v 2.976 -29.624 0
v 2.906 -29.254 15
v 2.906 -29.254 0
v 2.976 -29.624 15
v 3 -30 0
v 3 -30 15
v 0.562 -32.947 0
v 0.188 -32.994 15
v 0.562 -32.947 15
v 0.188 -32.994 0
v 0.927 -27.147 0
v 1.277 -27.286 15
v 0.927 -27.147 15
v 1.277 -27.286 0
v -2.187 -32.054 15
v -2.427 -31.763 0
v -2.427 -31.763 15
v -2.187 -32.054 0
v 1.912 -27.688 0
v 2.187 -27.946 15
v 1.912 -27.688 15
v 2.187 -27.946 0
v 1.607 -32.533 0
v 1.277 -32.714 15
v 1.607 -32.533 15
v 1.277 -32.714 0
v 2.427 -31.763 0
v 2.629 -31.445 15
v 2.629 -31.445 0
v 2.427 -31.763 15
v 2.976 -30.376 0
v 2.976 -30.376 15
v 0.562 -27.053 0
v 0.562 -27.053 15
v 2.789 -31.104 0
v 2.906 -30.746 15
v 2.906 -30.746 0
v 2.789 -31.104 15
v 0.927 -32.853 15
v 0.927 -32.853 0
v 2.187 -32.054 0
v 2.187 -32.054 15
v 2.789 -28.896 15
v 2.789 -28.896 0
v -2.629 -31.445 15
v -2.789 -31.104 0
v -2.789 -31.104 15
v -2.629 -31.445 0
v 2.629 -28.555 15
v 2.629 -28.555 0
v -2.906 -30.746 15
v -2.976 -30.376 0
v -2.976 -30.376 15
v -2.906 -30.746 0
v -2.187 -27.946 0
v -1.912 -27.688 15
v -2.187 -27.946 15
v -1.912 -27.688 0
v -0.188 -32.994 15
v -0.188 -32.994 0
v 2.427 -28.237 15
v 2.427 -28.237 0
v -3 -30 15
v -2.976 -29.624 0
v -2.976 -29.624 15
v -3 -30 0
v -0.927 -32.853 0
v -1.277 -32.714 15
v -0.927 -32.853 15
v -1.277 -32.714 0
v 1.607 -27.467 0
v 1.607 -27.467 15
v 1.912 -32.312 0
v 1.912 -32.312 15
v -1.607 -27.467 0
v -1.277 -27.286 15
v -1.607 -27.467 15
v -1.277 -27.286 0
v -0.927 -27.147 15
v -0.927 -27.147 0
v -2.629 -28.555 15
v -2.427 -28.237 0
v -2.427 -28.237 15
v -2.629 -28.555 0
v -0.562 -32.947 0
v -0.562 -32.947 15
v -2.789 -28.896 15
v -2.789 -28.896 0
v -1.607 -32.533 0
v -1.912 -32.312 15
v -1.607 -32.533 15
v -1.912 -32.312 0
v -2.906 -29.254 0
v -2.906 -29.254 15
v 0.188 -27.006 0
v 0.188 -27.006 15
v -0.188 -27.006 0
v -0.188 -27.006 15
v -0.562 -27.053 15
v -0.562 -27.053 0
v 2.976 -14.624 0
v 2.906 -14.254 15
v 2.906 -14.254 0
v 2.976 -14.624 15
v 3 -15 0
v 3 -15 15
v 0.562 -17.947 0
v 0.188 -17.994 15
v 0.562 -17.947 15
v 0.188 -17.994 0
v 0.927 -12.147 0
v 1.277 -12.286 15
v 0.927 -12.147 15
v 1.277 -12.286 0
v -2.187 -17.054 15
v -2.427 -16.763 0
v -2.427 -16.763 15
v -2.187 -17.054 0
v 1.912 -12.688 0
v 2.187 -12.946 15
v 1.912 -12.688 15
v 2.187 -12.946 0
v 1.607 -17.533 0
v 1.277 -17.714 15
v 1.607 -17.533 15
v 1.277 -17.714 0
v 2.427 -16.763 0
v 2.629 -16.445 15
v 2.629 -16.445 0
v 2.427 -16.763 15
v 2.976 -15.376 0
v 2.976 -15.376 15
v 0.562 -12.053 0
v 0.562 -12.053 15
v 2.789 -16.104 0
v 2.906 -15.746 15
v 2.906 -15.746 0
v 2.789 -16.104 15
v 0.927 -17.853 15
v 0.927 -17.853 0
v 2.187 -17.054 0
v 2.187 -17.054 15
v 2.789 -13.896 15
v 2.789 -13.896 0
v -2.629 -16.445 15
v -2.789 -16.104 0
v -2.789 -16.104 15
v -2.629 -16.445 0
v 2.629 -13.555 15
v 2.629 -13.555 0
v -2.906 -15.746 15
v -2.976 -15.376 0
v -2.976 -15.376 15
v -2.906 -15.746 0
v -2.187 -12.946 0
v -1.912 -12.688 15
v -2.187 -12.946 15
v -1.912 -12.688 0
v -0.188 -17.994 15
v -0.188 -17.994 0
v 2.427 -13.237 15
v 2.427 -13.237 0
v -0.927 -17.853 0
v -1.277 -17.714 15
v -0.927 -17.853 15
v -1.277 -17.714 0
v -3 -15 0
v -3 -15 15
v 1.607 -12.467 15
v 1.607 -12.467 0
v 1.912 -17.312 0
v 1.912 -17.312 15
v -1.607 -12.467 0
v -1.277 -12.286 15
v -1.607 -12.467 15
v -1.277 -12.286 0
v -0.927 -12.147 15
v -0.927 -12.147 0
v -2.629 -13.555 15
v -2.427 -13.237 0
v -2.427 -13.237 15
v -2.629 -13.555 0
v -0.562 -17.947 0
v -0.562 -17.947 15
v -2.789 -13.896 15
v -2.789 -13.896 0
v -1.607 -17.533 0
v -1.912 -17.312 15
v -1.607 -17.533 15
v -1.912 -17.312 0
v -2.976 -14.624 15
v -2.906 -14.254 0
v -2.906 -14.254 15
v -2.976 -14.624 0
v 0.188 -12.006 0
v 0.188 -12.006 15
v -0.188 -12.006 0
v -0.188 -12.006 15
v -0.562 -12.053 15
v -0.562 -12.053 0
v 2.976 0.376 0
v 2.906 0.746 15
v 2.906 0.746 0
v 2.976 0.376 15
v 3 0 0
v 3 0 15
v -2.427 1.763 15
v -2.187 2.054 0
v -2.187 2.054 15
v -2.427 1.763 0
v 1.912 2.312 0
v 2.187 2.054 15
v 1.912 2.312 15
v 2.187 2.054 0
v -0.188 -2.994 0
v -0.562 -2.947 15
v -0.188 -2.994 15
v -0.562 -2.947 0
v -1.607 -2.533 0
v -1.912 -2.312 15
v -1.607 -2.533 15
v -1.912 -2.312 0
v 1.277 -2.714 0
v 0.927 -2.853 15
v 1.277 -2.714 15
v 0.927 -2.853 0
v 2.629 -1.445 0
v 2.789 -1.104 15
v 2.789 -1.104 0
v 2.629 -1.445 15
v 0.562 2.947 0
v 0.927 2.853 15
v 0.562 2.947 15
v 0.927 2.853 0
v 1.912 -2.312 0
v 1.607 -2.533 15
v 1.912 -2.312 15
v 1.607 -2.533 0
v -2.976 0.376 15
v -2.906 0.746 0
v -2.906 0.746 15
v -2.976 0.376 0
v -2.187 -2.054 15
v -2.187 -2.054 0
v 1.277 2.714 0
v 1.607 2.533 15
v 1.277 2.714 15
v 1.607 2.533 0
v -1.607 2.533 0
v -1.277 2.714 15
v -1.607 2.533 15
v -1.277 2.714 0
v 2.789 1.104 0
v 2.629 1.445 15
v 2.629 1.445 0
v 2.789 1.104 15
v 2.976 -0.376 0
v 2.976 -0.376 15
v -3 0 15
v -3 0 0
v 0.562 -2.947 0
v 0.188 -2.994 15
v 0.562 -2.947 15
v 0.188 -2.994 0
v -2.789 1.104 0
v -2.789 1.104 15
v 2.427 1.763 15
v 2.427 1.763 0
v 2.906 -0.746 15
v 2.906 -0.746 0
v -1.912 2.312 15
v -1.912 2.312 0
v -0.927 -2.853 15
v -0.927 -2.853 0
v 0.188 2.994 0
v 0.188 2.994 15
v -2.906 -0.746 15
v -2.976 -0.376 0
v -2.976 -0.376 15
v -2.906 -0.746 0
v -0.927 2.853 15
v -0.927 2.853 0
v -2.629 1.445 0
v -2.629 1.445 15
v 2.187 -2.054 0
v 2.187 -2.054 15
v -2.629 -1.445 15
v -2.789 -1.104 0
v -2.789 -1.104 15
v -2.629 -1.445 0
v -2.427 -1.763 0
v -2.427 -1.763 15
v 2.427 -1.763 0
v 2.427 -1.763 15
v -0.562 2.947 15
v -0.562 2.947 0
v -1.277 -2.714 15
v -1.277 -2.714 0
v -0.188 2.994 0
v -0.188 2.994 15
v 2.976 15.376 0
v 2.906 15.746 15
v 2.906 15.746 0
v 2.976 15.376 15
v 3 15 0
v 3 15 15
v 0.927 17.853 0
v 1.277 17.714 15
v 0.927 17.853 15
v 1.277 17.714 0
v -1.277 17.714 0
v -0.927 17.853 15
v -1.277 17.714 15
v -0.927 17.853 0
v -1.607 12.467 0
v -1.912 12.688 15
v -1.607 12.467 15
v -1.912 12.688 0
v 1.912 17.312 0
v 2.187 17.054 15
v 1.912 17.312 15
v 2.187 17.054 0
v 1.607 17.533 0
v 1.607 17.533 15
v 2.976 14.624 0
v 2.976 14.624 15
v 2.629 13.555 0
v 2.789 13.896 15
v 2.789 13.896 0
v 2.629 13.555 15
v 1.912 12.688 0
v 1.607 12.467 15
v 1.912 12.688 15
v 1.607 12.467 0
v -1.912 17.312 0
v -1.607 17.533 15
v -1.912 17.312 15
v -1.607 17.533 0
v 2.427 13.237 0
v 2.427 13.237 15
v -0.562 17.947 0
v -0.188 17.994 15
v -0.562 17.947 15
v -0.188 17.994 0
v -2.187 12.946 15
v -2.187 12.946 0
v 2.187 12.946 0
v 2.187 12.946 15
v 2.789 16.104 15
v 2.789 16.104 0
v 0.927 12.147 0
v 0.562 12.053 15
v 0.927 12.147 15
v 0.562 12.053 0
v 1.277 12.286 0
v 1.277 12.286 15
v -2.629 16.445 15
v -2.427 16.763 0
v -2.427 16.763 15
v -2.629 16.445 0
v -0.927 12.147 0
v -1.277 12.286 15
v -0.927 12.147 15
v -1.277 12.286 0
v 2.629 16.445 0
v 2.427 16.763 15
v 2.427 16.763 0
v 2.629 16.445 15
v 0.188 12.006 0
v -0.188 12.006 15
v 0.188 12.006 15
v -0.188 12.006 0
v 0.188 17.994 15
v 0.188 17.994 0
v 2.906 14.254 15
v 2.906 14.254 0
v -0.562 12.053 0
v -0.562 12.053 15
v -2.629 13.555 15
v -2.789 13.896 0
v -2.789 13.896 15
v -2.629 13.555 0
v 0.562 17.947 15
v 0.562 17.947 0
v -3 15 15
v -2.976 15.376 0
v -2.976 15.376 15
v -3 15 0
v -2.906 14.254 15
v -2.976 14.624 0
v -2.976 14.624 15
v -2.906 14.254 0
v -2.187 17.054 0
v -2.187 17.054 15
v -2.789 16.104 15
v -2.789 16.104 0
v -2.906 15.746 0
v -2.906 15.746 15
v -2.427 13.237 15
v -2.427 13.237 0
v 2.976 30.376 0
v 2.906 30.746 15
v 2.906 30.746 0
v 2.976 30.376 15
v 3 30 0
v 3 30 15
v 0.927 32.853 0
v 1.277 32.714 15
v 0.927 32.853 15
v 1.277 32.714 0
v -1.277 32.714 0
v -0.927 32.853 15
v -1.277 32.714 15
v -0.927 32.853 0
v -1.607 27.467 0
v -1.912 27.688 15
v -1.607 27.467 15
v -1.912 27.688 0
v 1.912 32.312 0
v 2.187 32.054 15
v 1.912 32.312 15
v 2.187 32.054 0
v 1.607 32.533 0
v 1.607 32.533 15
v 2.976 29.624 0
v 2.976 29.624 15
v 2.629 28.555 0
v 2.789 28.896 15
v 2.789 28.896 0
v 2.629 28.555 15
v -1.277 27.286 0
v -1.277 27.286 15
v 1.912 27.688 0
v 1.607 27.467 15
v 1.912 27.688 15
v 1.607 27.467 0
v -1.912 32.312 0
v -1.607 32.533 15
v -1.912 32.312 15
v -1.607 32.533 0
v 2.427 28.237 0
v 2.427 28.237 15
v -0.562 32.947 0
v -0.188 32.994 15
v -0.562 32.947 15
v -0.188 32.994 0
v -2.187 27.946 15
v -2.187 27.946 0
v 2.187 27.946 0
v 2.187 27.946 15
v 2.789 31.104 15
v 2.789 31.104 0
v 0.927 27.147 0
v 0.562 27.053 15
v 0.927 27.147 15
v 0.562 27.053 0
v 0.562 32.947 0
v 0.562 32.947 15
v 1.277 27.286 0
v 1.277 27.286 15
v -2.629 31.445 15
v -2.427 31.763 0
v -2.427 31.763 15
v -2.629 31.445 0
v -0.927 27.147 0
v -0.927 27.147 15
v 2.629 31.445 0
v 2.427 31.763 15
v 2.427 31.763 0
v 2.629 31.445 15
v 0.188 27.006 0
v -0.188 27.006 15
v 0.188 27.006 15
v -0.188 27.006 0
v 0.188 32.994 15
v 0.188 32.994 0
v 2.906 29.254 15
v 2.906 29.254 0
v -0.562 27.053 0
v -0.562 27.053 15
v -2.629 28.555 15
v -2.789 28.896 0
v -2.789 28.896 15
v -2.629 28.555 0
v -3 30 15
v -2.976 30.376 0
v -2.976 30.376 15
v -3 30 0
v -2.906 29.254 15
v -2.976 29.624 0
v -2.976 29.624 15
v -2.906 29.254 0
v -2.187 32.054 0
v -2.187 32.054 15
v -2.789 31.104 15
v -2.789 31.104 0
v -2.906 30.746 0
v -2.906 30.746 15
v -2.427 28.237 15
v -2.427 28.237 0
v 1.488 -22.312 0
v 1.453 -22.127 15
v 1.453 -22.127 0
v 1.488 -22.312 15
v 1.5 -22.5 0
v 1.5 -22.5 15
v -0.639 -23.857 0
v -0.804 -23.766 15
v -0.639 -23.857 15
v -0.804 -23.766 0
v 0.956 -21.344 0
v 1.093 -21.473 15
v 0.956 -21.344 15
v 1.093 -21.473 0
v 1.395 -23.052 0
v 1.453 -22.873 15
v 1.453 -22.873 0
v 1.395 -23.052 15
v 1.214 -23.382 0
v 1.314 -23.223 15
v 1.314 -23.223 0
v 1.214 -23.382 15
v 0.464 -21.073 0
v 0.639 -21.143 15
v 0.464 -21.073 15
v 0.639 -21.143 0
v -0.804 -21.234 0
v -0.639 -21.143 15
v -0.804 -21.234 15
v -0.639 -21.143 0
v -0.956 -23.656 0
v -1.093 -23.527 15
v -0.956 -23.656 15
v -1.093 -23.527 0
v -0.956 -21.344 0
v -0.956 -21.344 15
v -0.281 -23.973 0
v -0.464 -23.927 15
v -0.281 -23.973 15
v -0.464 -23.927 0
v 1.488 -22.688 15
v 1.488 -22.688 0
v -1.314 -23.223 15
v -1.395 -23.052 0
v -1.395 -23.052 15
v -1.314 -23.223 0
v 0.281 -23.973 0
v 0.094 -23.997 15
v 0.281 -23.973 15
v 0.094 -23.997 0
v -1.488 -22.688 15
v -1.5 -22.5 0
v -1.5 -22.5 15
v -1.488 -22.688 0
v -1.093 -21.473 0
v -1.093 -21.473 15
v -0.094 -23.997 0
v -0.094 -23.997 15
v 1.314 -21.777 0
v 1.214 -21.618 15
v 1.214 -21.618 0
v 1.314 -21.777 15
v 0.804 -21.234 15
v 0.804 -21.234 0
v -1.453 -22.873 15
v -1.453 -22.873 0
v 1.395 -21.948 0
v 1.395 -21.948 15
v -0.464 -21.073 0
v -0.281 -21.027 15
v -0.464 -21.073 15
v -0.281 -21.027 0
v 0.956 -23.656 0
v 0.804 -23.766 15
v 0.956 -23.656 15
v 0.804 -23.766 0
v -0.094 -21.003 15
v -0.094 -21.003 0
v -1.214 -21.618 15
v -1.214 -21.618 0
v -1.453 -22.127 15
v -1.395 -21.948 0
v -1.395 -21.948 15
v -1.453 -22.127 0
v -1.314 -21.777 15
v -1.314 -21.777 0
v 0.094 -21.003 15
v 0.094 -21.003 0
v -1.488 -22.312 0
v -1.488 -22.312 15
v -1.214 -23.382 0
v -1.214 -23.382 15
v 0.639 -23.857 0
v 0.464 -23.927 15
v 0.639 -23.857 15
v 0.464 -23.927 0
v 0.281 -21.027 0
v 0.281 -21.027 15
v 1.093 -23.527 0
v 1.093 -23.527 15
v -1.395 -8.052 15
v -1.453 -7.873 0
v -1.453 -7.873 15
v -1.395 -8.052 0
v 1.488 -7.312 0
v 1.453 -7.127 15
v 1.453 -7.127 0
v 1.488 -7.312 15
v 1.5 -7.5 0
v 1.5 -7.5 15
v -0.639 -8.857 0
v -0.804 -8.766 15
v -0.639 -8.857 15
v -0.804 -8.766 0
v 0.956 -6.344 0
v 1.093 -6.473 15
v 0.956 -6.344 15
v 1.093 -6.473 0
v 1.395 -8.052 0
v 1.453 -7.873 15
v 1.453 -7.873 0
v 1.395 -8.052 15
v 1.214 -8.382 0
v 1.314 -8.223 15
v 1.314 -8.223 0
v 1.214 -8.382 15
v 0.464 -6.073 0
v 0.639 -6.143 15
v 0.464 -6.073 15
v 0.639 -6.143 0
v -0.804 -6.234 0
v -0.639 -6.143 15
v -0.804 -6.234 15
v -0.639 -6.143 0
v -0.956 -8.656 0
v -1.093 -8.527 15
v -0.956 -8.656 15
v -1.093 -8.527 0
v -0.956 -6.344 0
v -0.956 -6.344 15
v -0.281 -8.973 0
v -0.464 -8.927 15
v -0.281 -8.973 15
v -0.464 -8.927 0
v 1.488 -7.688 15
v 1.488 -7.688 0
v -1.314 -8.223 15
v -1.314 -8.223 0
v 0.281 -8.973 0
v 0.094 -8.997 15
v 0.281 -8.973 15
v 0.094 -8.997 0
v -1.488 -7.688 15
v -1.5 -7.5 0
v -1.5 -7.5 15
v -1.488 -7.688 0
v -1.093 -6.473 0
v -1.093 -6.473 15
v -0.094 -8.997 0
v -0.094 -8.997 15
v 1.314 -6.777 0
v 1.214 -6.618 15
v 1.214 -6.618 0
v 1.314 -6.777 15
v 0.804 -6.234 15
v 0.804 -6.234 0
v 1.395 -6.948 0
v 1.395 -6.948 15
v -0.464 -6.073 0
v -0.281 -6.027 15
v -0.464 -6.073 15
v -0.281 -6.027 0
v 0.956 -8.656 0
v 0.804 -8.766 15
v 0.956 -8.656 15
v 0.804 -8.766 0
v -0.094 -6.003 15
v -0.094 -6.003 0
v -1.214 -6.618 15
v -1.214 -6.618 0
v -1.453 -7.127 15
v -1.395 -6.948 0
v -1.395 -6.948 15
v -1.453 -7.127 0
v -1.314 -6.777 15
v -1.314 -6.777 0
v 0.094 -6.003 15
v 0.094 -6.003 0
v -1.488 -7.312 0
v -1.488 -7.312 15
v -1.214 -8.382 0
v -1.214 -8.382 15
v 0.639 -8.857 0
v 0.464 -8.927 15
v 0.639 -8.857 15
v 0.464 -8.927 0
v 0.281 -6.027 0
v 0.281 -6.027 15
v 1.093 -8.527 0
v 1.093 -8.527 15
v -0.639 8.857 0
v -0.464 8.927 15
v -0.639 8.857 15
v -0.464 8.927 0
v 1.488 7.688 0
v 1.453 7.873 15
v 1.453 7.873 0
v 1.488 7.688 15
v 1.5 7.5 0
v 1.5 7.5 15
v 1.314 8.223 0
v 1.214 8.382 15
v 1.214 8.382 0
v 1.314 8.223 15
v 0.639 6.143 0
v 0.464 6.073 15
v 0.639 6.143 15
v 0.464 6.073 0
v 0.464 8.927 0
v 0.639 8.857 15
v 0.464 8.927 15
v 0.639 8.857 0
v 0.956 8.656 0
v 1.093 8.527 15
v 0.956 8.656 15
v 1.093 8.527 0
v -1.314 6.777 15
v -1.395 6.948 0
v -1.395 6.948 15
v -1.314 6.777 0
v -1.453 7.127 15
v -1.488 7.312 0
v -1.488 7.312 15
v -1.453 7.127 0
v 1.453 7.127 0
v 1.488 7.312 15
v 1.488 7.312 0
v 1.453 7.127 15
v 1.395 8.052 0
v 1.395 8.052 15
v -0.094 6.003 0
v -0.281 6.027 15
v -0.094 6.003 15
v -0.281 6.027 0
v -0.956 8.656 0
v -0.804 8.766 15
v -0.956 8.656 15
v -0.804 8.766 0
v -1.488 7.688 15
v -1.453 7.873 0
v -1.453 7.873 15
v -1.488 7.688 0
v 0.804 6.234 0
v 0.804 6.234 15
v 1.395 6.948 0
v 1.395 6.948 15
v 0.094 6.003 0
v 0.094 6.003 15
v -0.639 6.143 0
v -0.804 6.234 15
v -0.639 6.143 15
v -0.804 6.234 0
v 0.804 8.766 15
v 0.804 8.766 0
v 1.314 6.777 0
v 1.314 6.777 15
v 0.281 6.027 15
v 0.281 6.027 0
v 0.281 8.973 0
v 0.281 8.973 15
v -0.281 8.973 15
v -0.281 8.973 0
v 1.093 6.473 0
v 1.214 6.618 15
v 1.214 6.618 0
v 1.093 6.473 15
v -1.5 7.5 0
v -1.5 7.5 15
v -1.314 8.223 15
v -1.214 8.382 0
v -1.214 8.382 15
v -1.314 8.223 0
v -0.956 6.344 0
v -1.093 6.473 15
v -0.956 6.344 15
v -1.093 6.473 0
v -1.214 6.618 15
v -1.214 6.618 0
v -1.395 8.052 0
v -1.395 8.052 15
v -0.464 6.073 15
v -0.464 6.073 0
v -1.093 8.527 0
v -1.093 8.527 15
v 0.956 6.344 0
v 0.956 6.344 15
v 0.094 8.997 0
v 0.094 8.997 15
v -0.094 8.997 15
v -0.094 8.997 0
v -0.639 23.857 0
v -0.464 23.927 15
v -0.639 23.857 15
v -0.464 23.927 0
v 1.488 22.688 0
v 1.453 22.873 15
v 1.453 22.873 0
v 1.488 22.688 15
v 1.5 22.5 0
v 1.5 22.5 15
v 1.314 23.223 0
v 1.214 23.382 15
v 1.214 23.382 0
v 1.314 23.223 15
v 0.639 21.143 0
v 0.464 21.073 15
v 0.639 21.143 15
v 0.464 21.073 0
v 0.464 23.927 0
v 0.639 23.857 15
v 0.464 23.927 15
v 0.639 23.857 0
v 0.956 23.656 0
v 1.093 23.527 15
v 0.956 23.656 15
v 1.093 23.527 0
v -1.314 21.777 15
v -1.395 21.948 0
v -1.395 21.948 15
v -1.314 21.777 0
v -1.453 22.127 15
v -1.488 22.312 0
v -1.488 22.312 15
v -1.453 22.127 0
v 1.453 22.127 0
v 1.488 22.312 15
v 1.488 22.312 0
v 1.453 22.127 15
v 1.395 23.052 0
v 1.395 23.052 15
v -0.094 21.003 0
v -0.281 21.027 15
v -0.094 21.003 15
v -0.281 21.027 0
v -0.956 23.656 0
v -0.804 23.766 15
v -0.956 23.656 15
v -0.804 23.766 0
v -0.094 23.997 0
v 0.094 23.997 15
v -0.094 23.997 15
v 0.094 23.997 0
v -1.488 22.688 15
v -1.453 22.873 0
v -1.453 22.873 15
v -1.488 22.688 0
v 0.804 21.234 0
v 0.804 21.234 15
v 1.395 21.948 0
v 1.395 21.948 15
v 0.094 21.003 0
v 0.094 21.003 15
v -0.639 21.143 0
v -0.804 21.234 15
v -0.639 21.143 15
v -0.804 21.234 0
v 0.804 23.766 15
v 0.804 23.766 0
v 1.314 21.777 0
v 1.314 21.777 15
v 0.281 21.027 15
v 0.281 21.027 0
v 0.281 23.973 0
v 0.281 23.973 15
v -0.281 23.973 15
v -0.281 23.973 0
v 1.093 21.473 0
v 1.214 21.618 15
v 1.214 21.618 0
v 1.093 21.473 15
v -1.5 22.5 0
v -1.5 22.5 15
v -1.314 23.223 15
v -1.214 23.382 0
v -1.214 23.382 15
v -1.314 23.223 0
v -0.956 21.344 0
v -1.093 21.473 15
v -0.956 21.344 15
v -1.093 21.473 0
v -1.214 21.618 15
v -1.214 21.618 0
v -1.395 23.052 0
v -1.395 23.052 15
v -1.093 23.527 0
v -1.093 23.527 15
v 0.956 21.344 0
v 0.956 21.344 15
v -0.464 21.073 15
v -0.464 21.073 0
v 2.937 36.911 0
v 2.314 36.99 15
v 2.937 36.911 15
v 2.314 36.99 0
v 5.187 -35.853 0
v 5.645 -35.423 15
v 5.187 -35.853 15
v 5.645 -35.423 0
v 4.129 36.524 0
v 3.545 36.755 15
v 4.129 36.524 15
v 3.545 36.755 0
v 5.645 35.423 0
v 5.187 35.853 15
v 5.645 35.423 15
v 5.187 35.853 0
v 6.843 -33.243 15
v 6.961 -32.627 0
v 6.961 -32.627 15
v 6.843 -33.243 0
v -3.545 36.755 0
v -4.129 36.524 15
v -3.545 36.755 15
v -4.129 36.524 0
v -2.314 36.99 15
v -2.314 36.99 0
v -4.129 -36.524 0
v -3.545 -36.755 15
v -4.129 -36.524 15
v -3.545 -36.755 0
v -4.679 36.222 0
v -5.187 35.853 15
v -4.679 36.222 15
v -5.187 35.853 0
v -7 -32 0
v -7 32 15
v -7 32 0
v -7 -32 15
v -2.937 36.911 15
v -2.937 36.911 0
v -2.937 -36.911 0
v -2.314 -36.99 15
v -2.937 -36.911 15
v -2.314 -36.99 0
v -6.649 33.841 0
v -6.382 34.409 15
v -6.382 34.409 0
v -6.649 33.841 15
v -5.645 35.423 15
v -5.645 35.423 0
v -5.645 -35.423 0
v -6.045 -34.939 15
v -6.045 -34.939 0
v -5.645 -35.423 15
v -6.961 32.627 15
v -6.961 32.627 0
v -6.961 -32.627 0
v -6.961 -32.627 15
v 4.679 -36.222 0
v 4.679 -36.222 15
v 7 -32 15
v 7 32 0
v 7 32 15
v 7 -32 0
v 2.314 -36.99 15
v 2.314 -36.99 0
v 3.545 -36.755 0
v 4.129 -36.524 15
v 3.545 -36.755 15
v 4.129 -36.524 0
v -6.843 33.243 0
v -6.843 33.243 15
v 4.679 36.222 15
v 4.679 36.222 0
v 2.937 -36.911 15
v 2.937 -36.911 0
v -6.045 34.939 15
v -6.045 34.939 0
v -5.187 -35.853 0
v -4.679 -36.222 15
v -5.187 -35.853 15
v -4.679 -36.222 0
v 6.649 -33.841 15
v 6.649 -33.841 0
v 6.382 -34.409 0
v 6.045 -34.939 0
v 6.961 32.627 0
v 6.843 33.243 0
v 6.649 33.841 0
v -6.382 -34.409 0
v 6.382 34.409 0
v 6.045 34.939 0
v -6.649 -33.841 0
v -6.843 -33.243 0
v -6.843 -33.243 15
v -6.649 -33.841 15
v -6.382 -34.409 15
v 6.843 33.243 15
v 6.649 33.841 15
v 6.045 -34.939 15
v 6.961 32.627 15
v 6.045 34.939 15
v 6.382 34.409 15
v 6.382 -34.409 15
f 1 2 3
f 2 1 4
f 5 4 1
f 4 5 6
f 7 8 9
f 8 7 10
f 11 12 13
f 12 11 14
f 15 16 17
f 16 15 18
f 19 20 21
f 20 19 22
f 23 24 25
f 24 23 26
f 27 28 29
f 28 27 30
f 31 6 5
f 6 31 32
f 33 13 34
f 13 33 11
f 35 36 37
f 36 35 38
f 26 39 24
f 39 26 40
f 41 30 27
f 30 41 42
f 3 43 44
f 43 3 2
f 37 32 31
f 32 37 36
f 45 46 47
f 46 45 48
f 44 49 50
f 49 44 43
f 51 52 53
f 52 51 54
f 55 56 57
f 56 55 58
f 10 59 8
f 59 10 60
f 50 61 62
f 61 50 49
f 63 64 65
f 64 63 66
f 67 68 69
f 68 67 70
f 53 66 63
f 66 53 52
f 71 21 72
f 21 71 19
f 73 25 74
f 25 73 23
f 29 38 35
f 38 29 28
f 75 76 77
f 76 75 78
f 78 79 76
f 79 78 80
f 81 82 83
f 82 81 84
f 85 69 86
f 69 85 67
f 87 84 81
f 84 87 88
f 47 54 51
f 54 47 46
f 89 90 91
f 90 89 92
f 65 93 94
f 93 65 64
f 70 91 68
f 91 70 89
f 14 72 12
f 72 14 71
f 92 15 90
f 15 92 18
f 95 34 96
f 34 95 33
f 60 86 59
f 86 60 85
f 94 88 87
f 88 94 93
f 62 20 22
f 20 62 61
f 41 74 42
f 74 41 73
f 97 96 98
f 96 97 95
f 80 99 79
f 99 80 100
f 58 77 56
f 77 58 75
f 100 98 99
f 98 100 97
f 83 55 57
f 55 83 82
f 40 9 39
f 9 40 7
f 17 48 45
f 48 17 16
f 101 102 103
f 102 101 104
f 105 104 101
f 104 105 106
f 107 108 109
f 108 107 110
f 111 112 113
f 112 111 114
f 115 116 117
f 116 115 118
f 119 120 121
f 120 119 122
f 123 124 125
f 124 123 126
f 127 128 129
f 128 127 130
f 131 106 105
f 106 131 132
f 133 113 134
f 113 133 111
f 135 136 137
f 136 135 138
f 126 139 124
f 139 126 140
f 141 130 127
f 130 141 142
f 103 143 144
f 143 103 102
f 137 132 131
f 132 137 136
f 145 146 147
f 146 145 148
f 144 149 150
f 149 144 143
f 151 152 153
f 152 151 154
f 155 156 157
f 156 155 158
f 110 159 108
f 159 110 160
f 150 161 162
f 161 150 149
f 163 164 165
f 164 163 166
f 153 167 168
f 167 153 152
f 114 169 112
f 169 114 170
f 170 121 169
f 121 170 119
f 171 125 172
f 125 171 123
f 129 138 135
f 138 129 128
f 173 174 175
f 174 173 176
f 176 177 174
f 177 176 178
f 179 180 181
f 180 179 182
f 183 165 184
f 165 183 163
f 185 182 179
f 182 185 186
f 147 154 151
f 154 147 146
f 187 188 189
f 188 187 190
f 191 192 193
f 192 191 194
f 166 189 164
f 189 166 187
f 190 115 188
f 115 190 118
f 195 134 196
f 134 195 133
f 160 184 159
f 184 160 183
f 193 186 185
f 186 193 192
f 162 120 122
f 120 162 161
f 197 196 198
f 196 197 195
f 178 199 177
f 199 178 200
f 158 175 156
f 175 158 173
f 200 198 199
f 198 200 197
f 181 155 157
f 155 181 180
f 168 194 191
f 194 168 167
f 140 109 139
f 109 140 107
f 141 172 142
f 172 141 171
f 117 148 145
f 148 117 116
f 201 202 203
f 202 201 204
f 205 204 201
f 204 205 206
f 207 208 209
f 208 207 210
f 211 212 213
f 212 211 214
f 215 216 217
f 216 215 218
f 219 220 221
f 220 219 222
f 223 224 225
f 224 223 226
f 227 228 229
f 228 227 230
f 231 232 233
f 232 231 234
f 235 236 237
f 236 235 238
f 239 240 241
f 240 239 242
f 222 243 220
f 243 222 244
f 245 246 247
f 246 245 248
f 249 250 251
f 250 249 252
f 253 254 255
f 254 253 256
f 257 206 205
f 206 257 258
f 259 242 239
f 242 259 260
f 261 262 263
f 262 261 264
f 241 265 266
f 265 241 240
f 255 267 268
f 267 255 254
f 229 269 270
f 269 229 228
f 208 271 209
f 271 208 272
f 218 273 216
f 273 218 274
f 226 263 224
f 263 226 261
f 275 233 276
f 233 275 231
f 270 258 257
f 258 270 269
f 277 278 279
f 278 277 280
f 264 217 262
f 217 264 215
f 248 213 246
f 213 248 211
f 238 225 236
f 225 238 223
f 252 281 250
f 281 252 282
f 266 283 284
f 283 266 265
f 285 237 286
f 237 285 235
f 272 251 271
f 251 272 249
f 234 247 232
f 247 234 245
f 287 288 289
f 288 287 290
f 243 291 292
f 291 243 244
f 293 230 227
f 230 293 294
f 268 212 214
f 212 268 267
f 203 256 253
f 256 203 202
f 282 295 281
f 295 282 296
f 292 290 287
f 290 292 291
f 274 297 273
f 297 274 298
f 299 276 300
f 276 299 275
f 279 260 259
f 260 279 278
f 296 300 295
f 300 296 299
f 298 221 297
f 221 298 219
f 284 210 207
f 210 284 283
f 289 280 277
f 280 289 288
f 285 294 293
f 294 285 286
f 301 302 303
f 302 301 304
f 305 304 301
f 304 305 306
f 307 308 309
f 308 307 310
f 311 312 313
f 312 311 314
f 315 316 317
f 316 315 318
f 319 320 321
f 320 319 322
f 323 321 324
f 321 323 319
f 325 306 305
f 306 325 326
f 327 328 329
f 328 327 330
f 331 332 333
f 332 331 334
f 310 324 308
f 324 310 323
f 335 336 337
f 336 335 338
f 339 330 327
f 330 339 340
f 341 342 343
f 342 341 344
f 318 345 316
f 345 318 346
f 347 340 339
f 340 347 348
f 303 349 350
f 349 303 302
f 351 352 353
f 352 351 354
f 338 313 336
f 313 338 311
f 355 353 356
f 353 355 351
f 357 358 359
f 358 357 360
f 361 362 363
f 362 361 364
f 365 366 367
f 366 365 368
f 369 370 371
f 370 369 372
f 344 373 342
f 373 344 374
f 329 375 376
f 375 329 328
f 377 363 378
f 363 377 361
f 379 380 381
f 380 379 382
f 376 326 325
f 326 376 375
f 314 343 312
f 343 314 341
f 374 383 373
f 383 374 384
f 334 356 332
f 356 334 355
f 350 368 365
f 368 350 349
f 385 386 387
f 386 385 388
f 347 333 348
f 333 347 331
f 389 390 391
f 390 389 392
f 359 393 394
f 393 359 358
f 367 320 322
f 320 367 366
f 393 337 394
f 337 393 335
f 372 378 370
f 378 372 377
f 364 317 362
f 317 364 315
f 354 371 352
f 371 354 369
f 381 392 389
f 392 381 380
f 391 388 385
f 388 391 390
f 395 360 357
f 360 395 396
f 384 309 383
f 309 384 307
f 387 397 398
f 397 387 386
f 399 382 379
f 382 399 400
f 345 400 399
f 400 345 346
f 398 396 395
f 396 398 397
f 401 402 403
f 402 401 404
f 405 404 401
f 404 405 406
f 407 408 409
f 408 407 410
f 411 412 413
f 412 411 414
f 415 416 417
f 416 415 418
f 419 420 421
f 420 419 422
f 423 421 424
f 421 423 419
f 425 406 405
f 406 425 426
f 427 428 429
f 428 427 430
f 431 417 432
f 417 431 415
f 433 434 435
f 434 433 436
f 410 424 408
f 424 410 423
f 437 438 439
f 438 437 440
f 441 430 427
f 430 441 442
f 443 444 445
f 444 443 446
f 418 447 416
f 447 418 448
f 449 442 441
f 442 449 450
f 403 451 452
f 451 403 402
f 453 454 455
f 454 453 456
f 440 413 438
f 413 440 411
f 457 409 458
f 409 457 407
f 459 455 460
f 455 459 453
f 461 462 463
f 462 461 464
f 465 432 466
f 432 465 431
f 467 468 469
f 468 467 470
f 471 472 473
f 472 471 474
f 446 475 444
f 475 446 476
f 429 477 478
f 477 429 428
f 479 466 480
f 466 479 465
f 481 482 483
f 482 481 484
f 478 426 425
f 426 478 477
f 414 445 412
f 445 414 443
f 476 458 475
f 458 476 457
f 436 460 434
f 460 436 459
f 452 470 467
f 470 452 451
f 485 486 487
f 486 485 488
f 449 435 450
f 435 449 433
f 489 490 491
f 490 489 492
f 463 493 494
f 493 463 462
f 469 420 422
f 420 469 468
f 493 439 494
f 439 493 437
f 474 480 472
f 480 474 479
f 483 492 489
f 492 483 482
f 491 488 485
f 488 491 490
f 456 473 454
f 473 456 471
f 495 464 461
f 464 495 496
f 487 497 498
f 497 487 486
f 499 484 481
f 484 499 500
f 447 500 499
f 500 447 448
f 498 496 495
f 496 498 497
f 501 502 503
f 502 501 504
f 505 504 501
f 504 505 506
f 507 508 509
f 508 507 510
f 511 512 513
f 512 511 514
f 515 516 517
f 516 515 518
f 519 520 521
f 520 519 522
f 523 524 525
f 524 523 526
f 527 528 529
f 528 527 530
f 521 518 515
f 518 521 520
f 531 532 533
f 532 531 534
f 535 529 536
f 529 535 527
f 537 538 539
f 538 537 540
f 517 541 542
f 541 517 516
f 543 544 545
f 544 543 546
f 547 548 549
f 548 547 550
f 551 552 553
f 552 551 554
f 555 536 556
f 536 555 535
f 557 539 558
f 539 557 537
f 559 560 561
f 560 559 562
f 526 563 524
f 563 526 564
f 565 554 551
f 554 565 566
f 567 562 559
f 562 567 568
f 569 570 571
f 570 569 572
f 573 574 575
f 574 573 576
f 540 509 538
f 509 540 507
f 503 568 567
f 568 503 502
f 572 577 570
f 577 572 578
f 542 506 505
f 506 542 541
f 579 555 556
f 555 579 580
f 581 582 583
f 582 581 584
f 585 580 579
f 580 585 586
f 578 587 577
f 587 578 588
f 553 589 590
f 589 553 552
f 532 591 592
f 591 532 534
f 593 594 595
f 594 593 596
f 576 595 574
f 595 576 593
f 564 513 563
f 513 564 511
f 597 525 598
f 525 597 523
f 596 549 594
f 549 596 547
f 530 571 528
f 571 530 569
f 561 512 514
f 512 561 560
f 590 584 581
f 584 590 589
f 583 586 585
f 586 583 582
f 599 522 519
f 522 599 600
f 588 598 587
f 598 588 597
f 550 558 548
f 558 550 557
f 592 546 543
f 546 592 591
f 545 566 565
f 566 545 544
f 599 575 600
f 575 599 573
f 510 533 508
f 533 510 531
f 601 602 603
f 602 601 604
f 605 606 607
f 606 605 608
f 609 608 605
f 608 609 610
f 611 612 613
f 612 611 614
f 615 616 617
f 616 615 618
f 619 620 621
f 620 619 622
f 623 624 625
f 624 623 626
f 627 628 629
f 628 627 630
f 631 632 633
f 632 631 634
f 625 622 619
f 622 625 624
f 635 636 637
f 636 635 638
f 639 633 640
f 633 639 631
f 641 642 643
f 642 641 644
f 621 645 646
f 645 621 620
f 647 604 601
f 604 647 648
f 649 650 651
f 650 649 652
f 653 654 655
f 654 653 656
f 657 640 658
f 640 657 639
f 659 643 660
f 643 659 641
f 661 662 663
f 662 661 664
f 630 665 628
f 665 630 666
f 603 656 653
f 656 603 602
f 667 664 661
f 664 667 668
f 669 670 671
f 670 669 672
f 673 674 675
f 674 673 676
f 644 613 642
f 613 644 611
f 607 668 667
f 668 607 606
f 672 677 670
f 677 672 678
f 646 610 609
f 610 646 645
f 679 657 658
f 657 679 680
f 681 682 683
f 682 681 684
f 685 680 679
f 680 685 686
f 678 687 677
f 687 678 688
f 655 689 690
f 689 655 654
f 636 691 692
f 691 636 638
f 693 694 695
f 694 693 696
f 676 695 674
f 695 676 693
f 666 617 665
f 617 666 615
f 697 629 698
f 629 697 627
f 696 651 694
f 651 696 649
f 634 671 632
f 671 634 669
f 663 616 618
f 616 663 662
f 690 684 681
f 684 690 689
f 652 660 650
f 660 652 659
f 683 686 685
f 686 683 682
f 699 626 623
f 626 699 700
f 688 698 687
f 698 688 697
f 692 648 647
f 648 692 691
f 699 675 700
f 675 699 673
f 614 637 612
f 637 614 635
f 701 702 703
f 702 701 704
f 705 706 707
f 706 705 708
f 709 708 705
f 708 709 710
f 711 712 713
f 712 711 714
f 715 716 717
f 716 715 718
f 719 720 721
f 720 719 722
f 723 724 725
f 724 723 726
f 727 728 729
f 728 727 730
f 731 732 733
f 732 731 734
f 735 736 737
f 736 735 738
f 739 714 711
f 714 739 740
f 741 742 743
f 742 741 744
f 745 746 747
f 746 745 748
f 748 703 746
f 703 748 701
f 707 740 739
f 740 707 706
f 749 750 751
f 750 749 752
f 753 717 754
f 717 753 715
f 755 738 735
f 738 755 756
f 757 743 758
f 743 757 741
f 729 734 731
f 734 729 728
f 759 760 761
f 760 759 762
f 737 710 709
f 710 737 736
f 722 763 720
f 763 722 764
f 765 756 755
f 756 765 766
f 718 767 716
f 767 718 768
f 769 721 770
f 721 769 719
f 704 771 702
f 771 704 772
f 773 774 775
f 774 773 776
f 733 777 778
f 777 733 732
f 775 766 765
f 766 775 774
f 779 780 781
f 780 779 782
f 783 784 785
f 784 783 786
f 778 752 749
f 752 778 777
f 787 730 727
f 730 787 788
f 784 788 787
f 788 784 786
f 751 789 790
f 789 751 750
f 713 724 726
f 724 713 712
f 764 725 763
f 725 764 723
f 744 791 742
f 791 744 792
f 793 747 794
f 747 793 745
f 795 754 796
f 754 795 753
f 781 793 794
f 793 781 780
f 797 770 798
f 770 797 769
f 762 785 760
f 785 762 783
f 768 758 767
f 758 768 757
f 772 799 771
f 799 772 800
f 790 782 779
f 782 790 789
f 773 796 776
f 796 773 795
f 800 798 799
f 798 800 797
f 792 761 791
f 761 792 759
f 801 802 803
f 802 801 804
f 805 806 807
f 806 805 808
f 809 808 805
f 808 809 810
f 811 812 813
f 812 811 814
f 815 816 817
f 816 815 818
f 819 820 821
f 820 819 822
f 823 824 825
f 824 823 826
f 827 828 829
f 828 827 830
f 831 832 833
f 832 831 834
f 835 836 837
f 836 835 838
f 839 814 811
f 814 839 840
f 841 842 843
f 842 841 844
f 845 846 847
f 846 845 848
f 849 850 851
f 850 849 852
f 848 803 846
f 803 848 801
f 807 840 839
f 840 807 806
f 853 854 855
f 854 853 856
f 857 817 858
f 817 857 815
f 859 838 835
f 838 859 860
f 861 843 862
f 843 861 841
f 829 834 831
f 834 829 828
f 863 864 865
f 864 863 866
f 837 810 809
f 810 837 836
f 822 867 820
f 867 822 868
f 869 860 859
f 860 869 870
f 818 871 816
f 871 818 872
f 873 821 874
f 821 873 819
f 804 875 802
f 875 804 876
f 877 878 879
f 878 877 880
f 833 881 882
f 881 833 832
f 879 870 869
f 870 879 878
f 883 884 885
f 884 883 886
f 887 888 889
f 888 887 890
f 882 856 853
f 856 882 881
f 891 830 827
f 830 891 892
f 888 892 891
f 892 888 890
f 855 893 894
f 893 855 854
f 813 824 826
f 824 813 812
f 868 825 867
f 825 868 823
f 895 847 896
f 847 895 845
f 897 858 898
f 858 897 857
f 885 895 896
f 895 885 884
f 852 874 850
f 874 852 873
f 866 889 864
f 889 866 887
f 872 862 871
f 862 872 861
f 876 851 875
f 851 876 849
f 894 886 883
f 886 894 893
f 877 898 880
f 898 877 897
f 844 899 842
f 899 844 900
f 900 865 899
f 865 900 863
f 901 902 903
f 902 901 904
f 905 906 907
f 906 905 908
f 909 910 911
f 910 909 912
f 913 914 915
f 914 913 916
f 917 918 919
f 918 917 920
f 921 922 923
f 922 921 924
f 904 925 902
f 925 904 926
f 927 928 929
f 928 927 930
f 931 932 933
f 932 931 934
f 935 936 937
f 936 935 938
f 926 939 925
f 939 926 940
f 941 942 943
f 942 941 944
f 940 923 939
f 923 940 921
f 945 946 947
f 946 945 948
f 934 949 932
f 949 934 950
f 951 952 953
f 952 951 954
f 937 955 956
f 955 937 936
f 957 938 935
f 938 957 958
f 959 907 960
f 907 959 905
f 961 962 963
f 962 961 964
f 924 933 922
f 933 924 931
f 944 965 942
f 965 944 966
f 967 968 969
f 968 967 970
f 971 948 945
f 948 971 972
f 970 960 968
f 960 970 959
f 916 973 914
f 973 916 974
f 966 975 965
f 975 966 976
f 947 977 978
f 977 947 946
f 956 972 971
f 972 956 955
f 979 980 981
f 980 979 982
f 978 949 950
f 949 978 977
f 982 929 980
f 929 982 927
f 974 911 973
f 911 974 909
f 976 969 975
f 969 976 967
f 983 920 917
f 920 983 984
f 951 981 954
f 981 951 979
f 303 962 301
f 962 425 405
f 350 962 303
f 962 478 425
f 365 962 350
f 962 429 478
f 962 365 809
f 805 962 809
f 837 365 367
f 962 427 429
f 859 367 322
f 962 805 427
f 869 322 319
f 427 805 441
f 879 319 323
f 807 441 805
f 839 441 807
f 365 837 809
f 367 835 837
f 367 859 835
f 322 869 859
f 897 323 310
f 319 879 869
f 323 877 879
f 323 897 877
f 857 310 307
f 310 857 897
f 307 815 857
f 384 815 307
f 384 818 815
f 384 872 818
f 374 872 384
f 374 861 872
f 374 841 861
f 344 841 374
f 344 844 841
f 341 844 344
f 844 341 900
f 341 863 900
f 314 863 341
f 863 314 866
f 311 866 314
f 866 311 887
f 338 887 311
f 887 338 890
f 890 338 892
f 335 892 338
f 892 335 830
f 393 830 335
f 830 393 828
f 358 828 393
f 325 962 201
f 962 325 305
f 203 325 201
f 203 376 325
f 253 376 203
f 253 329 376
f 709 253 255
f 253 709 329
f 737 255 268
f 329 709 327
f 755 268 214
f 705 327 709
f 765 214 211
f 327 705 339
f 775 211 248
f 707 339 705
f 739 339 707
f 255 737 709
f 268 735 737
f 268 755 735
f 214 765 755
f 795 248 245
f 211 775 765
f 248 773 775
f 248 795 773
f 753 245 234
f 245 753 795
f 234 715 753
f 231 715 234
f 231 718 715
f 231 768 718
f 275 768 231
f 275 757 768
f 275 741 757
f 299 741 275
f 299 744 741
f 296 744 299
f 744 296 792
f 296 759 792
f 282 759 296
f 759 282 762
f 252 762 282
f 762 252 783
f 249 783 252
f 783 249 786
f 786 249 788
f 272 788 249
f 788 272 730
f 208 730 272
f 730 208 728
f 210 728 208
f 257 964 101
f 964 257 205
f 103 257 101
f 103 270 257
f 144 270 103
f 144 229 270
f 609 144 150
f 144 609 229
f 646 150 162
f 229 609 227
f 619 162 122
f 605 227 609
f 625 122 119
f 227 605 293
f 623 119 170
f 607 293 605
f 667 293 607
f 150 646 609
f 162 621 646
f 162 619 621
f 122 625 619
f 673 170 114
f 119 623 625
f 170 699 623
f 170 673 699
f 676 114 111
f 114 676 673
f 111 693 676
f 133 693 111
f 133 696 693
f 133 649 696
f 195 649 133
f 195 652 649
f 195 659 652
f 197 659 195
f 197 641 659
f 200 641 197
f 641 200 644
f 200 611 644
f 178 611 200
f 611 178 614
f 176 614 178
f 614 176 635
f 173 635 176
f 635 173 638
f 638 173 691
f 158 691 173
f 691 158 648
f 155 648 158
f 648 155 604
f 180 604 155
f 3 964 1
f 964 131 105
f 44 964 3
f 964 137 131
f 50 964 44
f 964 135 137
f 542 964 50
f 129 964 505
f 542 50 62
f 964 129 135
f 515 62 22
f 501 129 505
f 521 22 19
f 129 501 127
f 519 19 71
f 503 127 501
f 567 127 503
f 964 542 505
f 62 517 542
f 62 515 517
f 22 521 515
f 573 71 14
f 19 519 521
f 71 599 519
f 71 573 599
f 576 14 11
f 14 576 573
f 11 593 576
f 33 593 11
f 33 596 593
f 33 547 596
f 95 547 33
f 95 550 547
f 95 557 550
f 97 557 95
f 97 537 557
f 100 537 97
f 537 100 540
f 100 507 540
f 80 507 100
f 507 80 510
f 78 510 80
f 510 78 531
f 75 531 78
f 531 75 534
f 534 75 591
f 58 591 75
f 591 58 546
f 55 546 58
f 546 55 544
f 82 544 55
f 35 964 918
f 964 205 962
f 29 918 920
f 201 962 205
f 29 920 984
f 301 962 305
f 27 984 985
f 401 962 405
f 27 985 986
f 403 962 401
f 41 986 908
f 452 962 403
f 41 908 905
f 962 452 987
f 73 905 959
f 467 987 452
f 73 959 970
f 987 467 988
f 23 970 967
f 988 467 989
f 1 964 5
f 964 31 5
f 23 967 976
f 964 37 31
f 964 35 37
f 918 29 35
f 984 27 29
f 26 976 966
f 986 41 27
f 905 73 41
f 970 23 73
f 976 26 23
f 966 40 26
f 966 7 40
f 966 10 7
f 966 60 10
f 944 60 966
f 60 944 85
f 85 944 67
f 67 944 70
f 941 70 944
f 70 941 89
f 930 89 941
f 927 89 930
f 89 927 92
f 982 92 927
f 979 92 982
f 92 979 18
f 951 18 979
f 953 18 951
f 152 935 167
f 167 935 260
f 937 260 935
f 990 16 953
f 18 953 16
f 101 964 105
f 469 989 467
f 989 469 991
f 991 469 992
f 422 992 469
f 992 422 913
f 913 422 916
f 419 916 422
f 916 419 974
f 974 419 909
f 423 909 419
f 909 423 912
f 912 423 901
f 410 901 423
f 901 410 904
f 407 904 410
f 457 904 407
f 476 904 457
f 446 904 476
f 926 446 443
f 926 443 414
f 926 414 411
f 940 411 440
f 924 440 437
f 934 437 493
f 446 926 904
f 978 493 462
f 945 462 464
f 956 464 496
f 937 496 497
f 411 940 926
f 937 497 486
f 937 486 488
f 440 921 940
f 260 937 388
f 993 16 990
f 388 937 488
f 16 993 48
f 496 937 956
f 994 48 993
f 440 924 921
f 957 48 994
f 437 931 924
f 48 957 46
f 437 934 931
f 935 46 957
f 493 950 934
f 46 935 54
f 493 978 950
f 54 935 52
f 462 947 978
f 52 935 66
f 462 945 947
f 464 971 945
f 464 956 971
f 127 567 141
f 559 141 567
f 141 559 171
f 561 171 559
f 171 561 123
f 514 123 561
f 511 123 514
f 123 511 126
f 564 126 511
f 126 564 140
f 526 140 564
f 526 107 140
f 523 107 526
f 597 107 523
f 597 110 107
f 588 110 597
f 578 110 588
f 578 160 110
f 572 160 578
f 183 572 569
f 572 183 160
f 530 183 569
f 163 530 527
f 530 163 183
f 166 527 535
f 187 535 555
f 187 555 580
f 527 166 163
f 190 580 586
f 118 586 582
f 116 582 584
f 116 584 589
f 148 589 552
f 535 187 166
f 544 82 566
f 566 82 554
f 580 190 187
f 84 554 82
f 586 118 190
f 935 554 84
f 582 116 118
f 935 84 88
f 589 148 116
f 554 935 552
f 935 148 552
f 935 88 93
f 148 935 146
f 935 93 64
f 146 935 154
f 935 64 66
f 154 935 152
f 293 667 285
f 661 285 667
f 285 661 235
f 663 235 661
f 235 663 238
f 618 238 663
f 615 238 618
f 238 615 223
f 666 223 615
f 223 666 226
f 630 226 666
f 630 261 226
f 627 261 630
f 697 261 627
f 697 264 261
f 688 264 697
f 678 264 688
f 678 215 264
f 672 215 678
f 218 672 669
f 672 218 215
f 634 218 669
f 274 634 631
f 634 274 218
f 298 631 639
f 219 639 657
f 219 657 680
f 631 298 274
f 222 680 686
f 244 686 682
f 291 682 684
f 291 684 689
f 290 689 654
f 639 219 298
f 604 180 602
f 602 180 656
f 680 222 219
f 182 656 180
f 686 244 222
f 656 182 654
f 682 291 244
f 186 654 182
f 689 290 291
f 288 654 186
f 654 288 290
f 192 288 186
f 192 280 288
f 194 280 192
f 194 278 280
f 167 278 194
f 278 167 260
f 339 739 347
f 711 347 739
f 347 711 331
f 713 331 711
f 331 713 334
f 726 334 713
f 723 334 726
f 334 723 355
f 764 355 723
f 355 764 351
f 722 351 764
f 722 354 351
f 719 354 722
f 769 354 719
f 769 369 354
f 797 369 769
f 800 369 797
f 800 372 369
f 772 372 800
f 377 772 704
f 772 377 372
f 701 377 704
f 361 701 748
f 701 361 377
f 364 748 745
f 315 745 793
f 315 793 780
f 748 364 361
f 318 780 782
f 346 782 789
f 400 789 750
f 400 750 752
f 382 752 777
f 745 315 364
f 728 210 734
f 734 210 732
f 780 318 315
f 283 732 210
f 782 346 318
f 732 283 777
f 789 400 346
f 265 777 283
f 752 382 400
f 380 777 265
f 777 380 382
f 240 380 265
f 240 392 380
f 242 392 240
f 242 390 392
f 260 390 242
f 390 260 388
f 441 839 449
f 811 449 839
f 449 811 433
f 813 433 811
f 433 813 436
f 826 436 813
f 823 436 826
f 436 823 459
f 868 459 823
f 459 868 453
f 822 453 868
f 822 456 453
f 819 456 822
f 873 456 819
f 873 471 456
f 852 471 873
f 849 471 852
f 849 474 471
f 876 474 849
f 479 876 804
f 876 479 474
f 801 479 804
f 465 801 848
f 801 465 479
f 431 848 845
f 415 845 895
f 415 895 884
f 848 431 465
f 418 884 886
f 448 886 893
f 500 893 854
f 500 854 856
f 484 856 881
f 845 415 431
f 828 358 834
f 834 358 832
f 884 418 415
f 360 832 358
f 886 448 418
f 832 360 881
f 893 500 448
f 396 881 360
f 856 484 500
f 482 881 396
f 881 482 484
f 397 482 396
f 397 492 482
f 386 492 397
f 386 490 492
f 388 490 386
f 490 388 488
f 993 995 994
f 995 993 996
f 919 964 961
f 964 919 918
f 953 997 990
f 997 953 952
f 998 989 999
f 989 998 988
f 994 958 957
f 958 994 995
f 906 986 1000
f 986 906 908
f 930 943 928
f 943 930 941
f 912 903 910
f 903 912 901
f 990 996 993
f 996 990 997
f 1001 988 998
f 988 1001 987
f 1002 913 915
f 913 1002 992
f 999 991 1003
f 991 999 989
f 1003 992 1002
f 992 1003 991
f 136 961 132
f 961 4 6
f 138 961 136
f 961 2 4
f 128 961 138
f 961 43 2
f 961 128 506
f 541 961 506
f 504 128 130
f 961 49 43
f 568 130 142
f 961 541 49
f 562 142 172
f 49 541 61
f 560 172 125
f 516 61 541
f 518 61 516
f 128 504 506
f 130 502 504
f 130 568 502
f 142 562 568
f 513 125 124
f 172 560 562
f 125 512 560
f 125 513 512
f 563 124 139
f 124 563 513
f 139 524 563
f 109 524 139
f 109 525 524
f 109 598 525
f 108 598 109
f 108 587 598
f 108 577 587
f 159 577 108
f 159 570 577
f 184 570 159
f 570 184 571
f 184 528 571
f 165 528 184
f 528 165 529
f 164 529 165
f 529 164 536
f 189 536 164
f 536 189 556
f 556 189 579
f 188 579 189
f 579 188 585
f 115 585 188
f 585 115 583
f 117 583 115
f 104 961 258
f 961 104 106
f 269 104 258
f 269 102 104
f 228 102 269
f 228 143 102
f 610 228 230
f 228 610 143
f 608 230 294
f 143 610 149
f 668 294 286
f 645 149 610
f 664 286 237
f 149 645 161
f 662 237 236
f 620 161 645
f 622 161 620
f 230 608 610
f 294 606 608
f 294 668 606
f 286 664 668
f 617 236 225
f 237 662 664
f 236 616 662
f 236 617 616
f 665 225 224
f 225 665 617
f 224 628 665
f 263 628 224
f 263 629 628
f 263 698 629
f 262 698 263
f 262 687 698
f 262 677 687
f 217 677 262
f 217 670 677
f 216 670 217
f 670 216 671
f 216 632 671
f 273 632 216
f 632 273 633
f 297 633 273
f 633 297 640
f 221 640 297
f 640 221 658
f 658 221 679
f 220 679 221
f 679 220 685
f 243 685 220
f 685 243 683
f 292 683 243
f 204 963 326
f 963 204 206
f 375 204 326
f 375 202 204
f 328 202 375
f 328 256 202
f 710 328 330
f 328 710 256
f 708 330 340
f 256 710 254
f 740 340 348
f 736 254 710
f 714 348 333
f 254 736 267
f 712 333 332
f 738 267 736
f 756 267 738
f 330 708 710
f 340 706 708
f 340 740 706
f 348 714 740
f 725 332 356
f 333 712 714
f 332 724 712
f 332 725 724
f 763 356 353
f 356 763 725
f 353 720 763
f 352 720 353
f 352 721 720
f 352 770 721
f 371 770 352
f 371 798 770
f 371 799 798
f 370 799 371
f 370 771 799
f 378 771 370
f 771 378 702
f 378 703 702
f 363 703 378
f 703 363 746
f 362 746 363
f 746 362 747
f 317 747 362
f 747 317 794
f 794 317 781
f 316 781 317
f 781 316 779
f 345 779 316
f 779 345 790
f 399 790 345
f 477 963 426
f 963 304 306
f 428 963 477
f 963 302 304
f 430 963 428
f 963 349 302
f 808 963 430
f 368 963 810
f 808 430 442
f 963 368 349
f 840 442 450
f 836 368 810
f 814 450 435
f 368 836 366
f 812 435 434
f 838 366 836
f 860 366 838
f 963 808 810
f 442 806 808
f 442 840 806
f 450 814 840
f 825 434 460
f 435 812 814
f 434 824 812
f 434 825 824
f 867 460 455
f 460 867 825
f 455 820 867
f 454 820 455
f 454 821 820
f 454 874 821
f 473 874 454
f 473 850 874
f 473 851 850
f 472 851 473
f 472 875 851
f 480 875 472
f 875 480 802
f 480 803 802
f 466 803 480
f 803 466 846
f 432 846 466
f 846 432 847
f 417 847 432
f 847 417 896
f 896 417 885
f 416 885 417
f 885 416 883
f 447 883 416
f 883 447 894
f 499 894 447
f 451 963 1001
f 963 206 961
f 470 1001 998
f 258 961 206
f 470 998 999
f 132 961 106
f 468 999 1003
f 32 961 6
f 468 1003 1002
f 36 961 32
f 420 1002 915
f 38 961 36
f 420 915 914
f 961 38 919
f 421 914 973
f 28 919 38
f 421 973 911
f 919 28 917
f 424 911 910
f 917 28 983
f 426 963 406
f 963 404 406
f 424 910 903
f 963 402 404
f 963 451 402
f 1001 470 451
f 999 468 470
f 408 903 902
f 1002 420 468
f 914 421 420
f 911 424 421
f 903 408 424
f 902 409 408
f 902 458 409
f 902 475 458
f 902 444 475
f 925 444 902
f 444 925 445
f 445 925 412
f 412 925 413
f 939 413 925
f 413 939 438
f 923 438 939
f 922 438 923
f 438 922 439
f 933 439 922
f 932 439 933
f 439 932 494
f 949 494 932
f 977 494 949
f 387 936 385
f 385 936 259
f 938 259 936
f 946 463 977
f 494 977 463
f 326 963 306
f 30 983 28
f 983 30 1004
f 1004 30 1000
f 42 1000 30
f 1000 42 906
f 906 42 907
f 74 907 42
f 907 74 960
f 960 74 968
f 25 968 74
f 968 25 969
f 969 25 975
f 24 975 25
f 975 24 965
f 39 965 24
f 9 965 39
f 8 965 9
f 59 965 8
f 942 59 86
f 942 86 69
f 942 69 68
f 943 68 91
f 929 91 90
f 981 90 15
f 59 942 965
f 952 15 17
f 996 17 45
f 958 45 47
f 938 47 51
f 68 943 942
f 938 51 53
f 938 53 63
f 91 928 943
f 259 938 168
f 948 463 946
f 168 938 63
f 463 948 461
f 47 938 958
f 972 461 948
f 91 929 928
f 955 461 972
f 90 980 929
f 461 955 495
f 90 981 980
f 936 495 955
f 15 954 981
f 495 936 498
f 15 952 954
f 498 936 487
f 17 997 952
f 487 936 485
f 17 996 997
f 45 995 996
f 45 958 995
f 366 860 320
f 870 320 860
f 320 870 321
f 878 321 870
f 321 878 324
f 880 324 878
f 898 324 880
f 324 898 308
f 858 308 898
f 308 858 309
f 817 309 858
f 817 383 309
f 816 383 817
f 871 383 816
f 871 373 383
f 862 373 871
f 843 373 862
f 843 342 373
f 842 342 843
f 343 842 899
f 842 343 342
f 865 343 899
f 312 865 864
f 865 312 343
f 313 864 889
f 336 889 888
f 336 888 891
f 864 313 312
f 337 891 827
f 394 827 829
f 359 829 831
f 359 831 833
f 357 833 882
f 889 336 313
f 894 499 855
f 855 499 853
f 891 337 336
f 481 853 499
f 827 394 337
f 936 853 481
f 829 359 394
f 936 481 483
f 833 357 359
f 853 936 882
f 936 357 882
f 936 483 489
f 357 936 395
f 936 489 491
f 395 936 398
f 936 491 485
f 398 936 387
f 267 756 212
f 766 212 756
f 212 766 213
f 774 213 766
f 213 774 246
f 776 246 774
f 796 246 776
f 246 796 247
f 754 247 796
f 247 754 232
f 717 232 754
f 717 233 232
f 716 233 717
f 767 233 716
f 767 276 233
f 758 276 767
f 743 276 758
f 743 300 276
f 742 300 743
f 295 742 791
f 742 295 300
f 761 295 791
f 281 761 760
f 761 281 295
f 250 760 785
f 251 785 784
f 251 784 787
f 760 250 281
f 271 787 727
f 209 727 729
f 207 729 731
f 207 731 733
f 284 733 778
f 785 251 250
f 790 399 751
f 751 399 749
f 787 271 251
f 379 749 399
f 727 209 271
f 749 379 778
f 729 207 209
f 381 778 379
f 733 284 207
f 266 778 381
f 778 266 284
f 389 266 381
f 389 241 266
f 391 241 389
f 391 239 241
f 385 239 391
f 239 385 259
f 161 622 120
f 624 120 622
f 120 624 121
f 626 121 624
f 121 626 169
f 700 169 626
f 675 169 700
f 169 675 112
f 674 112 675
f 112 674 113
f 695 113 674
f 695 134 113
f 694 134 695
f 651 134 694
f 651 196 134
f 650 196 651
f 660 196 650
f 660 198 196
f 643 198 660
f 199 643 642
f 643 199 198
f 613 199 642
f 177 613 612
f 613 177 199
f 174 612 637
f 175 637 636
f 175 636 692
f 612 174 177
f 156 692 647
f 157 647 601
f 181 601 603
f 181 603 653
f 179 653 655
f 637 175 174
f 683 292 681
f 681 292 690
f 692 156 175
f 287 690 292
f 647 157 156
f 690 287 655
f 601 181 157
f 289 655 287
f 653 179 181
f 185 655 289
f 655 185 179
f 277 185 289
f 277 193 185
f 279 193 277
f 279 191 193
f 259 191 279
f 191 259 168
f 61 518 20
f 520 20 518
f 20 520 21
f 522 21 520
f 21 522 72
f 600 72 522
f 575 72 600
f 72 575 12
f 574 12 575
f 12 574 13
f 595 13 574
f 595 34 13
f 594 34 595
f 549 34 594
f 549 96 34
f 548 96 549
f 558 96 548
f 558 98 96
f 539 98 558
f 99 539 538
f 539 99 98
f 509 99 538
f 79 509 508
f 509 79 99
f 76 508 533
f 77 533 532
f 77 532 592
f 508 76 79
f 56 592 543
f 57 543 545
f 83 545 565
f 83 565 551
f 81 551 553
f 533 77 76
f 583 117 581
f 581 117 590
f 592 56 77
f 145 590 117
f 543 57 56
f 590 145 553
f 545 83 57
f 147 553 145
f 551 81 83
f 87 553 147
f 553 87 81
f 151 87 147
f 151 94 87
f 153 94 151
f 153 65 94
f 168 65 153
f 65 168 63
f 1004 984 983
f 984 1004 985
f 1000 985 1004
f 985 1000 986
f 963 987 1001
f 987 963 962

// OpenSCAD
$fn = 50;

difference() {
	union() {
		hull() {
			translate(v = [-2.0, 32.0, 0]) {
				cylinder(h = 15, r = 5);
			}
			translate(v = [2.0, 32.0, 0]) {
				cylinder(h = 15, r = 5);
			}
			translate(v = [-2.0, -32.0, 0]) {
				cylinder(h = 15, r = 5);
			}
			translate(v = [2.0, -32.0, 0]) {
				cylinder(h = 15, r = 5);
			}
		}
	}
	union() {
		translate(v = [0.0, -30.0, 0]) {
			translate(v = [0, 0, -100]) {
				cylinder(h = 200, r = 3.0);
			}
		}
		translate(v = [0.0, -15.0, 0]) {
			translate(v = [0, 0, -100]) {
				cylinder(h = 200, r = 3.0);
			}
		}
		translate(v = [0, 0, -100]) {
			cylinder(h = 200, r = 3.0);
		}
		translate(v = [0.0, 15.0, 0]) {
			translate(v = [0, 0, -100]) {
				cylinder(h = 200, r = 3.0);
			}
		}
		translate(v = [0.0, 30.0, 0]) {
			translate(v = [0, 0, -100]) {
				cylinder(h = 200, r = 3.0);
			}
		}
		translate(v = [0.0, -30.0, 0]) {
			translate(v = [0, 0, -100]) {
				cylinder(h = 200, r = 1.5);
			}
		}
		translate(v = [0.0, -22.5, 0]) {
			translate(v = [0, 0, -100]) {
				cylinder(h = 200, r = 1.5);
			}
		}
		translate(v = [0.0, -15.0, 0]) {
			translate(v = [0, 0, -100]) {
				cylinder(h = 200, r = 1.5);
			}
		}
		translate(v = [0.0, -7.5, 0]) {
			translate(v = [0, 0, -100]) {
				cylinder(h = 200, r = 1.5);
			}
		}
		translate(v = [0, 0, -100]) {
			cylinder(h = 200, r = 1.5);
		}
		translate(v = [0.0, 7.5, 0]) {
			translate(v = [0, 0, -100]) {
				cylinder(h = 200, r = 1.5);
			}
		}
		translate(v = [0.0, 15.0, 0]) {
			translate(v = [0, 0, -100]) {
				cylinder(h = 200, r = 1.5);
			}
		}
		translate(v = [0.0, 22.5, 0]) {
			translate(v = [0, 0, -100]) {
				cylinder(h = 200, r = 1.5);
			}
		}
		translate(v = [0.0, 30.0, 0]) {
			translate(v = [0, 0, -100]) {
				cylinder(h = 200, r = 1.5);
			}
		}
	}
}
